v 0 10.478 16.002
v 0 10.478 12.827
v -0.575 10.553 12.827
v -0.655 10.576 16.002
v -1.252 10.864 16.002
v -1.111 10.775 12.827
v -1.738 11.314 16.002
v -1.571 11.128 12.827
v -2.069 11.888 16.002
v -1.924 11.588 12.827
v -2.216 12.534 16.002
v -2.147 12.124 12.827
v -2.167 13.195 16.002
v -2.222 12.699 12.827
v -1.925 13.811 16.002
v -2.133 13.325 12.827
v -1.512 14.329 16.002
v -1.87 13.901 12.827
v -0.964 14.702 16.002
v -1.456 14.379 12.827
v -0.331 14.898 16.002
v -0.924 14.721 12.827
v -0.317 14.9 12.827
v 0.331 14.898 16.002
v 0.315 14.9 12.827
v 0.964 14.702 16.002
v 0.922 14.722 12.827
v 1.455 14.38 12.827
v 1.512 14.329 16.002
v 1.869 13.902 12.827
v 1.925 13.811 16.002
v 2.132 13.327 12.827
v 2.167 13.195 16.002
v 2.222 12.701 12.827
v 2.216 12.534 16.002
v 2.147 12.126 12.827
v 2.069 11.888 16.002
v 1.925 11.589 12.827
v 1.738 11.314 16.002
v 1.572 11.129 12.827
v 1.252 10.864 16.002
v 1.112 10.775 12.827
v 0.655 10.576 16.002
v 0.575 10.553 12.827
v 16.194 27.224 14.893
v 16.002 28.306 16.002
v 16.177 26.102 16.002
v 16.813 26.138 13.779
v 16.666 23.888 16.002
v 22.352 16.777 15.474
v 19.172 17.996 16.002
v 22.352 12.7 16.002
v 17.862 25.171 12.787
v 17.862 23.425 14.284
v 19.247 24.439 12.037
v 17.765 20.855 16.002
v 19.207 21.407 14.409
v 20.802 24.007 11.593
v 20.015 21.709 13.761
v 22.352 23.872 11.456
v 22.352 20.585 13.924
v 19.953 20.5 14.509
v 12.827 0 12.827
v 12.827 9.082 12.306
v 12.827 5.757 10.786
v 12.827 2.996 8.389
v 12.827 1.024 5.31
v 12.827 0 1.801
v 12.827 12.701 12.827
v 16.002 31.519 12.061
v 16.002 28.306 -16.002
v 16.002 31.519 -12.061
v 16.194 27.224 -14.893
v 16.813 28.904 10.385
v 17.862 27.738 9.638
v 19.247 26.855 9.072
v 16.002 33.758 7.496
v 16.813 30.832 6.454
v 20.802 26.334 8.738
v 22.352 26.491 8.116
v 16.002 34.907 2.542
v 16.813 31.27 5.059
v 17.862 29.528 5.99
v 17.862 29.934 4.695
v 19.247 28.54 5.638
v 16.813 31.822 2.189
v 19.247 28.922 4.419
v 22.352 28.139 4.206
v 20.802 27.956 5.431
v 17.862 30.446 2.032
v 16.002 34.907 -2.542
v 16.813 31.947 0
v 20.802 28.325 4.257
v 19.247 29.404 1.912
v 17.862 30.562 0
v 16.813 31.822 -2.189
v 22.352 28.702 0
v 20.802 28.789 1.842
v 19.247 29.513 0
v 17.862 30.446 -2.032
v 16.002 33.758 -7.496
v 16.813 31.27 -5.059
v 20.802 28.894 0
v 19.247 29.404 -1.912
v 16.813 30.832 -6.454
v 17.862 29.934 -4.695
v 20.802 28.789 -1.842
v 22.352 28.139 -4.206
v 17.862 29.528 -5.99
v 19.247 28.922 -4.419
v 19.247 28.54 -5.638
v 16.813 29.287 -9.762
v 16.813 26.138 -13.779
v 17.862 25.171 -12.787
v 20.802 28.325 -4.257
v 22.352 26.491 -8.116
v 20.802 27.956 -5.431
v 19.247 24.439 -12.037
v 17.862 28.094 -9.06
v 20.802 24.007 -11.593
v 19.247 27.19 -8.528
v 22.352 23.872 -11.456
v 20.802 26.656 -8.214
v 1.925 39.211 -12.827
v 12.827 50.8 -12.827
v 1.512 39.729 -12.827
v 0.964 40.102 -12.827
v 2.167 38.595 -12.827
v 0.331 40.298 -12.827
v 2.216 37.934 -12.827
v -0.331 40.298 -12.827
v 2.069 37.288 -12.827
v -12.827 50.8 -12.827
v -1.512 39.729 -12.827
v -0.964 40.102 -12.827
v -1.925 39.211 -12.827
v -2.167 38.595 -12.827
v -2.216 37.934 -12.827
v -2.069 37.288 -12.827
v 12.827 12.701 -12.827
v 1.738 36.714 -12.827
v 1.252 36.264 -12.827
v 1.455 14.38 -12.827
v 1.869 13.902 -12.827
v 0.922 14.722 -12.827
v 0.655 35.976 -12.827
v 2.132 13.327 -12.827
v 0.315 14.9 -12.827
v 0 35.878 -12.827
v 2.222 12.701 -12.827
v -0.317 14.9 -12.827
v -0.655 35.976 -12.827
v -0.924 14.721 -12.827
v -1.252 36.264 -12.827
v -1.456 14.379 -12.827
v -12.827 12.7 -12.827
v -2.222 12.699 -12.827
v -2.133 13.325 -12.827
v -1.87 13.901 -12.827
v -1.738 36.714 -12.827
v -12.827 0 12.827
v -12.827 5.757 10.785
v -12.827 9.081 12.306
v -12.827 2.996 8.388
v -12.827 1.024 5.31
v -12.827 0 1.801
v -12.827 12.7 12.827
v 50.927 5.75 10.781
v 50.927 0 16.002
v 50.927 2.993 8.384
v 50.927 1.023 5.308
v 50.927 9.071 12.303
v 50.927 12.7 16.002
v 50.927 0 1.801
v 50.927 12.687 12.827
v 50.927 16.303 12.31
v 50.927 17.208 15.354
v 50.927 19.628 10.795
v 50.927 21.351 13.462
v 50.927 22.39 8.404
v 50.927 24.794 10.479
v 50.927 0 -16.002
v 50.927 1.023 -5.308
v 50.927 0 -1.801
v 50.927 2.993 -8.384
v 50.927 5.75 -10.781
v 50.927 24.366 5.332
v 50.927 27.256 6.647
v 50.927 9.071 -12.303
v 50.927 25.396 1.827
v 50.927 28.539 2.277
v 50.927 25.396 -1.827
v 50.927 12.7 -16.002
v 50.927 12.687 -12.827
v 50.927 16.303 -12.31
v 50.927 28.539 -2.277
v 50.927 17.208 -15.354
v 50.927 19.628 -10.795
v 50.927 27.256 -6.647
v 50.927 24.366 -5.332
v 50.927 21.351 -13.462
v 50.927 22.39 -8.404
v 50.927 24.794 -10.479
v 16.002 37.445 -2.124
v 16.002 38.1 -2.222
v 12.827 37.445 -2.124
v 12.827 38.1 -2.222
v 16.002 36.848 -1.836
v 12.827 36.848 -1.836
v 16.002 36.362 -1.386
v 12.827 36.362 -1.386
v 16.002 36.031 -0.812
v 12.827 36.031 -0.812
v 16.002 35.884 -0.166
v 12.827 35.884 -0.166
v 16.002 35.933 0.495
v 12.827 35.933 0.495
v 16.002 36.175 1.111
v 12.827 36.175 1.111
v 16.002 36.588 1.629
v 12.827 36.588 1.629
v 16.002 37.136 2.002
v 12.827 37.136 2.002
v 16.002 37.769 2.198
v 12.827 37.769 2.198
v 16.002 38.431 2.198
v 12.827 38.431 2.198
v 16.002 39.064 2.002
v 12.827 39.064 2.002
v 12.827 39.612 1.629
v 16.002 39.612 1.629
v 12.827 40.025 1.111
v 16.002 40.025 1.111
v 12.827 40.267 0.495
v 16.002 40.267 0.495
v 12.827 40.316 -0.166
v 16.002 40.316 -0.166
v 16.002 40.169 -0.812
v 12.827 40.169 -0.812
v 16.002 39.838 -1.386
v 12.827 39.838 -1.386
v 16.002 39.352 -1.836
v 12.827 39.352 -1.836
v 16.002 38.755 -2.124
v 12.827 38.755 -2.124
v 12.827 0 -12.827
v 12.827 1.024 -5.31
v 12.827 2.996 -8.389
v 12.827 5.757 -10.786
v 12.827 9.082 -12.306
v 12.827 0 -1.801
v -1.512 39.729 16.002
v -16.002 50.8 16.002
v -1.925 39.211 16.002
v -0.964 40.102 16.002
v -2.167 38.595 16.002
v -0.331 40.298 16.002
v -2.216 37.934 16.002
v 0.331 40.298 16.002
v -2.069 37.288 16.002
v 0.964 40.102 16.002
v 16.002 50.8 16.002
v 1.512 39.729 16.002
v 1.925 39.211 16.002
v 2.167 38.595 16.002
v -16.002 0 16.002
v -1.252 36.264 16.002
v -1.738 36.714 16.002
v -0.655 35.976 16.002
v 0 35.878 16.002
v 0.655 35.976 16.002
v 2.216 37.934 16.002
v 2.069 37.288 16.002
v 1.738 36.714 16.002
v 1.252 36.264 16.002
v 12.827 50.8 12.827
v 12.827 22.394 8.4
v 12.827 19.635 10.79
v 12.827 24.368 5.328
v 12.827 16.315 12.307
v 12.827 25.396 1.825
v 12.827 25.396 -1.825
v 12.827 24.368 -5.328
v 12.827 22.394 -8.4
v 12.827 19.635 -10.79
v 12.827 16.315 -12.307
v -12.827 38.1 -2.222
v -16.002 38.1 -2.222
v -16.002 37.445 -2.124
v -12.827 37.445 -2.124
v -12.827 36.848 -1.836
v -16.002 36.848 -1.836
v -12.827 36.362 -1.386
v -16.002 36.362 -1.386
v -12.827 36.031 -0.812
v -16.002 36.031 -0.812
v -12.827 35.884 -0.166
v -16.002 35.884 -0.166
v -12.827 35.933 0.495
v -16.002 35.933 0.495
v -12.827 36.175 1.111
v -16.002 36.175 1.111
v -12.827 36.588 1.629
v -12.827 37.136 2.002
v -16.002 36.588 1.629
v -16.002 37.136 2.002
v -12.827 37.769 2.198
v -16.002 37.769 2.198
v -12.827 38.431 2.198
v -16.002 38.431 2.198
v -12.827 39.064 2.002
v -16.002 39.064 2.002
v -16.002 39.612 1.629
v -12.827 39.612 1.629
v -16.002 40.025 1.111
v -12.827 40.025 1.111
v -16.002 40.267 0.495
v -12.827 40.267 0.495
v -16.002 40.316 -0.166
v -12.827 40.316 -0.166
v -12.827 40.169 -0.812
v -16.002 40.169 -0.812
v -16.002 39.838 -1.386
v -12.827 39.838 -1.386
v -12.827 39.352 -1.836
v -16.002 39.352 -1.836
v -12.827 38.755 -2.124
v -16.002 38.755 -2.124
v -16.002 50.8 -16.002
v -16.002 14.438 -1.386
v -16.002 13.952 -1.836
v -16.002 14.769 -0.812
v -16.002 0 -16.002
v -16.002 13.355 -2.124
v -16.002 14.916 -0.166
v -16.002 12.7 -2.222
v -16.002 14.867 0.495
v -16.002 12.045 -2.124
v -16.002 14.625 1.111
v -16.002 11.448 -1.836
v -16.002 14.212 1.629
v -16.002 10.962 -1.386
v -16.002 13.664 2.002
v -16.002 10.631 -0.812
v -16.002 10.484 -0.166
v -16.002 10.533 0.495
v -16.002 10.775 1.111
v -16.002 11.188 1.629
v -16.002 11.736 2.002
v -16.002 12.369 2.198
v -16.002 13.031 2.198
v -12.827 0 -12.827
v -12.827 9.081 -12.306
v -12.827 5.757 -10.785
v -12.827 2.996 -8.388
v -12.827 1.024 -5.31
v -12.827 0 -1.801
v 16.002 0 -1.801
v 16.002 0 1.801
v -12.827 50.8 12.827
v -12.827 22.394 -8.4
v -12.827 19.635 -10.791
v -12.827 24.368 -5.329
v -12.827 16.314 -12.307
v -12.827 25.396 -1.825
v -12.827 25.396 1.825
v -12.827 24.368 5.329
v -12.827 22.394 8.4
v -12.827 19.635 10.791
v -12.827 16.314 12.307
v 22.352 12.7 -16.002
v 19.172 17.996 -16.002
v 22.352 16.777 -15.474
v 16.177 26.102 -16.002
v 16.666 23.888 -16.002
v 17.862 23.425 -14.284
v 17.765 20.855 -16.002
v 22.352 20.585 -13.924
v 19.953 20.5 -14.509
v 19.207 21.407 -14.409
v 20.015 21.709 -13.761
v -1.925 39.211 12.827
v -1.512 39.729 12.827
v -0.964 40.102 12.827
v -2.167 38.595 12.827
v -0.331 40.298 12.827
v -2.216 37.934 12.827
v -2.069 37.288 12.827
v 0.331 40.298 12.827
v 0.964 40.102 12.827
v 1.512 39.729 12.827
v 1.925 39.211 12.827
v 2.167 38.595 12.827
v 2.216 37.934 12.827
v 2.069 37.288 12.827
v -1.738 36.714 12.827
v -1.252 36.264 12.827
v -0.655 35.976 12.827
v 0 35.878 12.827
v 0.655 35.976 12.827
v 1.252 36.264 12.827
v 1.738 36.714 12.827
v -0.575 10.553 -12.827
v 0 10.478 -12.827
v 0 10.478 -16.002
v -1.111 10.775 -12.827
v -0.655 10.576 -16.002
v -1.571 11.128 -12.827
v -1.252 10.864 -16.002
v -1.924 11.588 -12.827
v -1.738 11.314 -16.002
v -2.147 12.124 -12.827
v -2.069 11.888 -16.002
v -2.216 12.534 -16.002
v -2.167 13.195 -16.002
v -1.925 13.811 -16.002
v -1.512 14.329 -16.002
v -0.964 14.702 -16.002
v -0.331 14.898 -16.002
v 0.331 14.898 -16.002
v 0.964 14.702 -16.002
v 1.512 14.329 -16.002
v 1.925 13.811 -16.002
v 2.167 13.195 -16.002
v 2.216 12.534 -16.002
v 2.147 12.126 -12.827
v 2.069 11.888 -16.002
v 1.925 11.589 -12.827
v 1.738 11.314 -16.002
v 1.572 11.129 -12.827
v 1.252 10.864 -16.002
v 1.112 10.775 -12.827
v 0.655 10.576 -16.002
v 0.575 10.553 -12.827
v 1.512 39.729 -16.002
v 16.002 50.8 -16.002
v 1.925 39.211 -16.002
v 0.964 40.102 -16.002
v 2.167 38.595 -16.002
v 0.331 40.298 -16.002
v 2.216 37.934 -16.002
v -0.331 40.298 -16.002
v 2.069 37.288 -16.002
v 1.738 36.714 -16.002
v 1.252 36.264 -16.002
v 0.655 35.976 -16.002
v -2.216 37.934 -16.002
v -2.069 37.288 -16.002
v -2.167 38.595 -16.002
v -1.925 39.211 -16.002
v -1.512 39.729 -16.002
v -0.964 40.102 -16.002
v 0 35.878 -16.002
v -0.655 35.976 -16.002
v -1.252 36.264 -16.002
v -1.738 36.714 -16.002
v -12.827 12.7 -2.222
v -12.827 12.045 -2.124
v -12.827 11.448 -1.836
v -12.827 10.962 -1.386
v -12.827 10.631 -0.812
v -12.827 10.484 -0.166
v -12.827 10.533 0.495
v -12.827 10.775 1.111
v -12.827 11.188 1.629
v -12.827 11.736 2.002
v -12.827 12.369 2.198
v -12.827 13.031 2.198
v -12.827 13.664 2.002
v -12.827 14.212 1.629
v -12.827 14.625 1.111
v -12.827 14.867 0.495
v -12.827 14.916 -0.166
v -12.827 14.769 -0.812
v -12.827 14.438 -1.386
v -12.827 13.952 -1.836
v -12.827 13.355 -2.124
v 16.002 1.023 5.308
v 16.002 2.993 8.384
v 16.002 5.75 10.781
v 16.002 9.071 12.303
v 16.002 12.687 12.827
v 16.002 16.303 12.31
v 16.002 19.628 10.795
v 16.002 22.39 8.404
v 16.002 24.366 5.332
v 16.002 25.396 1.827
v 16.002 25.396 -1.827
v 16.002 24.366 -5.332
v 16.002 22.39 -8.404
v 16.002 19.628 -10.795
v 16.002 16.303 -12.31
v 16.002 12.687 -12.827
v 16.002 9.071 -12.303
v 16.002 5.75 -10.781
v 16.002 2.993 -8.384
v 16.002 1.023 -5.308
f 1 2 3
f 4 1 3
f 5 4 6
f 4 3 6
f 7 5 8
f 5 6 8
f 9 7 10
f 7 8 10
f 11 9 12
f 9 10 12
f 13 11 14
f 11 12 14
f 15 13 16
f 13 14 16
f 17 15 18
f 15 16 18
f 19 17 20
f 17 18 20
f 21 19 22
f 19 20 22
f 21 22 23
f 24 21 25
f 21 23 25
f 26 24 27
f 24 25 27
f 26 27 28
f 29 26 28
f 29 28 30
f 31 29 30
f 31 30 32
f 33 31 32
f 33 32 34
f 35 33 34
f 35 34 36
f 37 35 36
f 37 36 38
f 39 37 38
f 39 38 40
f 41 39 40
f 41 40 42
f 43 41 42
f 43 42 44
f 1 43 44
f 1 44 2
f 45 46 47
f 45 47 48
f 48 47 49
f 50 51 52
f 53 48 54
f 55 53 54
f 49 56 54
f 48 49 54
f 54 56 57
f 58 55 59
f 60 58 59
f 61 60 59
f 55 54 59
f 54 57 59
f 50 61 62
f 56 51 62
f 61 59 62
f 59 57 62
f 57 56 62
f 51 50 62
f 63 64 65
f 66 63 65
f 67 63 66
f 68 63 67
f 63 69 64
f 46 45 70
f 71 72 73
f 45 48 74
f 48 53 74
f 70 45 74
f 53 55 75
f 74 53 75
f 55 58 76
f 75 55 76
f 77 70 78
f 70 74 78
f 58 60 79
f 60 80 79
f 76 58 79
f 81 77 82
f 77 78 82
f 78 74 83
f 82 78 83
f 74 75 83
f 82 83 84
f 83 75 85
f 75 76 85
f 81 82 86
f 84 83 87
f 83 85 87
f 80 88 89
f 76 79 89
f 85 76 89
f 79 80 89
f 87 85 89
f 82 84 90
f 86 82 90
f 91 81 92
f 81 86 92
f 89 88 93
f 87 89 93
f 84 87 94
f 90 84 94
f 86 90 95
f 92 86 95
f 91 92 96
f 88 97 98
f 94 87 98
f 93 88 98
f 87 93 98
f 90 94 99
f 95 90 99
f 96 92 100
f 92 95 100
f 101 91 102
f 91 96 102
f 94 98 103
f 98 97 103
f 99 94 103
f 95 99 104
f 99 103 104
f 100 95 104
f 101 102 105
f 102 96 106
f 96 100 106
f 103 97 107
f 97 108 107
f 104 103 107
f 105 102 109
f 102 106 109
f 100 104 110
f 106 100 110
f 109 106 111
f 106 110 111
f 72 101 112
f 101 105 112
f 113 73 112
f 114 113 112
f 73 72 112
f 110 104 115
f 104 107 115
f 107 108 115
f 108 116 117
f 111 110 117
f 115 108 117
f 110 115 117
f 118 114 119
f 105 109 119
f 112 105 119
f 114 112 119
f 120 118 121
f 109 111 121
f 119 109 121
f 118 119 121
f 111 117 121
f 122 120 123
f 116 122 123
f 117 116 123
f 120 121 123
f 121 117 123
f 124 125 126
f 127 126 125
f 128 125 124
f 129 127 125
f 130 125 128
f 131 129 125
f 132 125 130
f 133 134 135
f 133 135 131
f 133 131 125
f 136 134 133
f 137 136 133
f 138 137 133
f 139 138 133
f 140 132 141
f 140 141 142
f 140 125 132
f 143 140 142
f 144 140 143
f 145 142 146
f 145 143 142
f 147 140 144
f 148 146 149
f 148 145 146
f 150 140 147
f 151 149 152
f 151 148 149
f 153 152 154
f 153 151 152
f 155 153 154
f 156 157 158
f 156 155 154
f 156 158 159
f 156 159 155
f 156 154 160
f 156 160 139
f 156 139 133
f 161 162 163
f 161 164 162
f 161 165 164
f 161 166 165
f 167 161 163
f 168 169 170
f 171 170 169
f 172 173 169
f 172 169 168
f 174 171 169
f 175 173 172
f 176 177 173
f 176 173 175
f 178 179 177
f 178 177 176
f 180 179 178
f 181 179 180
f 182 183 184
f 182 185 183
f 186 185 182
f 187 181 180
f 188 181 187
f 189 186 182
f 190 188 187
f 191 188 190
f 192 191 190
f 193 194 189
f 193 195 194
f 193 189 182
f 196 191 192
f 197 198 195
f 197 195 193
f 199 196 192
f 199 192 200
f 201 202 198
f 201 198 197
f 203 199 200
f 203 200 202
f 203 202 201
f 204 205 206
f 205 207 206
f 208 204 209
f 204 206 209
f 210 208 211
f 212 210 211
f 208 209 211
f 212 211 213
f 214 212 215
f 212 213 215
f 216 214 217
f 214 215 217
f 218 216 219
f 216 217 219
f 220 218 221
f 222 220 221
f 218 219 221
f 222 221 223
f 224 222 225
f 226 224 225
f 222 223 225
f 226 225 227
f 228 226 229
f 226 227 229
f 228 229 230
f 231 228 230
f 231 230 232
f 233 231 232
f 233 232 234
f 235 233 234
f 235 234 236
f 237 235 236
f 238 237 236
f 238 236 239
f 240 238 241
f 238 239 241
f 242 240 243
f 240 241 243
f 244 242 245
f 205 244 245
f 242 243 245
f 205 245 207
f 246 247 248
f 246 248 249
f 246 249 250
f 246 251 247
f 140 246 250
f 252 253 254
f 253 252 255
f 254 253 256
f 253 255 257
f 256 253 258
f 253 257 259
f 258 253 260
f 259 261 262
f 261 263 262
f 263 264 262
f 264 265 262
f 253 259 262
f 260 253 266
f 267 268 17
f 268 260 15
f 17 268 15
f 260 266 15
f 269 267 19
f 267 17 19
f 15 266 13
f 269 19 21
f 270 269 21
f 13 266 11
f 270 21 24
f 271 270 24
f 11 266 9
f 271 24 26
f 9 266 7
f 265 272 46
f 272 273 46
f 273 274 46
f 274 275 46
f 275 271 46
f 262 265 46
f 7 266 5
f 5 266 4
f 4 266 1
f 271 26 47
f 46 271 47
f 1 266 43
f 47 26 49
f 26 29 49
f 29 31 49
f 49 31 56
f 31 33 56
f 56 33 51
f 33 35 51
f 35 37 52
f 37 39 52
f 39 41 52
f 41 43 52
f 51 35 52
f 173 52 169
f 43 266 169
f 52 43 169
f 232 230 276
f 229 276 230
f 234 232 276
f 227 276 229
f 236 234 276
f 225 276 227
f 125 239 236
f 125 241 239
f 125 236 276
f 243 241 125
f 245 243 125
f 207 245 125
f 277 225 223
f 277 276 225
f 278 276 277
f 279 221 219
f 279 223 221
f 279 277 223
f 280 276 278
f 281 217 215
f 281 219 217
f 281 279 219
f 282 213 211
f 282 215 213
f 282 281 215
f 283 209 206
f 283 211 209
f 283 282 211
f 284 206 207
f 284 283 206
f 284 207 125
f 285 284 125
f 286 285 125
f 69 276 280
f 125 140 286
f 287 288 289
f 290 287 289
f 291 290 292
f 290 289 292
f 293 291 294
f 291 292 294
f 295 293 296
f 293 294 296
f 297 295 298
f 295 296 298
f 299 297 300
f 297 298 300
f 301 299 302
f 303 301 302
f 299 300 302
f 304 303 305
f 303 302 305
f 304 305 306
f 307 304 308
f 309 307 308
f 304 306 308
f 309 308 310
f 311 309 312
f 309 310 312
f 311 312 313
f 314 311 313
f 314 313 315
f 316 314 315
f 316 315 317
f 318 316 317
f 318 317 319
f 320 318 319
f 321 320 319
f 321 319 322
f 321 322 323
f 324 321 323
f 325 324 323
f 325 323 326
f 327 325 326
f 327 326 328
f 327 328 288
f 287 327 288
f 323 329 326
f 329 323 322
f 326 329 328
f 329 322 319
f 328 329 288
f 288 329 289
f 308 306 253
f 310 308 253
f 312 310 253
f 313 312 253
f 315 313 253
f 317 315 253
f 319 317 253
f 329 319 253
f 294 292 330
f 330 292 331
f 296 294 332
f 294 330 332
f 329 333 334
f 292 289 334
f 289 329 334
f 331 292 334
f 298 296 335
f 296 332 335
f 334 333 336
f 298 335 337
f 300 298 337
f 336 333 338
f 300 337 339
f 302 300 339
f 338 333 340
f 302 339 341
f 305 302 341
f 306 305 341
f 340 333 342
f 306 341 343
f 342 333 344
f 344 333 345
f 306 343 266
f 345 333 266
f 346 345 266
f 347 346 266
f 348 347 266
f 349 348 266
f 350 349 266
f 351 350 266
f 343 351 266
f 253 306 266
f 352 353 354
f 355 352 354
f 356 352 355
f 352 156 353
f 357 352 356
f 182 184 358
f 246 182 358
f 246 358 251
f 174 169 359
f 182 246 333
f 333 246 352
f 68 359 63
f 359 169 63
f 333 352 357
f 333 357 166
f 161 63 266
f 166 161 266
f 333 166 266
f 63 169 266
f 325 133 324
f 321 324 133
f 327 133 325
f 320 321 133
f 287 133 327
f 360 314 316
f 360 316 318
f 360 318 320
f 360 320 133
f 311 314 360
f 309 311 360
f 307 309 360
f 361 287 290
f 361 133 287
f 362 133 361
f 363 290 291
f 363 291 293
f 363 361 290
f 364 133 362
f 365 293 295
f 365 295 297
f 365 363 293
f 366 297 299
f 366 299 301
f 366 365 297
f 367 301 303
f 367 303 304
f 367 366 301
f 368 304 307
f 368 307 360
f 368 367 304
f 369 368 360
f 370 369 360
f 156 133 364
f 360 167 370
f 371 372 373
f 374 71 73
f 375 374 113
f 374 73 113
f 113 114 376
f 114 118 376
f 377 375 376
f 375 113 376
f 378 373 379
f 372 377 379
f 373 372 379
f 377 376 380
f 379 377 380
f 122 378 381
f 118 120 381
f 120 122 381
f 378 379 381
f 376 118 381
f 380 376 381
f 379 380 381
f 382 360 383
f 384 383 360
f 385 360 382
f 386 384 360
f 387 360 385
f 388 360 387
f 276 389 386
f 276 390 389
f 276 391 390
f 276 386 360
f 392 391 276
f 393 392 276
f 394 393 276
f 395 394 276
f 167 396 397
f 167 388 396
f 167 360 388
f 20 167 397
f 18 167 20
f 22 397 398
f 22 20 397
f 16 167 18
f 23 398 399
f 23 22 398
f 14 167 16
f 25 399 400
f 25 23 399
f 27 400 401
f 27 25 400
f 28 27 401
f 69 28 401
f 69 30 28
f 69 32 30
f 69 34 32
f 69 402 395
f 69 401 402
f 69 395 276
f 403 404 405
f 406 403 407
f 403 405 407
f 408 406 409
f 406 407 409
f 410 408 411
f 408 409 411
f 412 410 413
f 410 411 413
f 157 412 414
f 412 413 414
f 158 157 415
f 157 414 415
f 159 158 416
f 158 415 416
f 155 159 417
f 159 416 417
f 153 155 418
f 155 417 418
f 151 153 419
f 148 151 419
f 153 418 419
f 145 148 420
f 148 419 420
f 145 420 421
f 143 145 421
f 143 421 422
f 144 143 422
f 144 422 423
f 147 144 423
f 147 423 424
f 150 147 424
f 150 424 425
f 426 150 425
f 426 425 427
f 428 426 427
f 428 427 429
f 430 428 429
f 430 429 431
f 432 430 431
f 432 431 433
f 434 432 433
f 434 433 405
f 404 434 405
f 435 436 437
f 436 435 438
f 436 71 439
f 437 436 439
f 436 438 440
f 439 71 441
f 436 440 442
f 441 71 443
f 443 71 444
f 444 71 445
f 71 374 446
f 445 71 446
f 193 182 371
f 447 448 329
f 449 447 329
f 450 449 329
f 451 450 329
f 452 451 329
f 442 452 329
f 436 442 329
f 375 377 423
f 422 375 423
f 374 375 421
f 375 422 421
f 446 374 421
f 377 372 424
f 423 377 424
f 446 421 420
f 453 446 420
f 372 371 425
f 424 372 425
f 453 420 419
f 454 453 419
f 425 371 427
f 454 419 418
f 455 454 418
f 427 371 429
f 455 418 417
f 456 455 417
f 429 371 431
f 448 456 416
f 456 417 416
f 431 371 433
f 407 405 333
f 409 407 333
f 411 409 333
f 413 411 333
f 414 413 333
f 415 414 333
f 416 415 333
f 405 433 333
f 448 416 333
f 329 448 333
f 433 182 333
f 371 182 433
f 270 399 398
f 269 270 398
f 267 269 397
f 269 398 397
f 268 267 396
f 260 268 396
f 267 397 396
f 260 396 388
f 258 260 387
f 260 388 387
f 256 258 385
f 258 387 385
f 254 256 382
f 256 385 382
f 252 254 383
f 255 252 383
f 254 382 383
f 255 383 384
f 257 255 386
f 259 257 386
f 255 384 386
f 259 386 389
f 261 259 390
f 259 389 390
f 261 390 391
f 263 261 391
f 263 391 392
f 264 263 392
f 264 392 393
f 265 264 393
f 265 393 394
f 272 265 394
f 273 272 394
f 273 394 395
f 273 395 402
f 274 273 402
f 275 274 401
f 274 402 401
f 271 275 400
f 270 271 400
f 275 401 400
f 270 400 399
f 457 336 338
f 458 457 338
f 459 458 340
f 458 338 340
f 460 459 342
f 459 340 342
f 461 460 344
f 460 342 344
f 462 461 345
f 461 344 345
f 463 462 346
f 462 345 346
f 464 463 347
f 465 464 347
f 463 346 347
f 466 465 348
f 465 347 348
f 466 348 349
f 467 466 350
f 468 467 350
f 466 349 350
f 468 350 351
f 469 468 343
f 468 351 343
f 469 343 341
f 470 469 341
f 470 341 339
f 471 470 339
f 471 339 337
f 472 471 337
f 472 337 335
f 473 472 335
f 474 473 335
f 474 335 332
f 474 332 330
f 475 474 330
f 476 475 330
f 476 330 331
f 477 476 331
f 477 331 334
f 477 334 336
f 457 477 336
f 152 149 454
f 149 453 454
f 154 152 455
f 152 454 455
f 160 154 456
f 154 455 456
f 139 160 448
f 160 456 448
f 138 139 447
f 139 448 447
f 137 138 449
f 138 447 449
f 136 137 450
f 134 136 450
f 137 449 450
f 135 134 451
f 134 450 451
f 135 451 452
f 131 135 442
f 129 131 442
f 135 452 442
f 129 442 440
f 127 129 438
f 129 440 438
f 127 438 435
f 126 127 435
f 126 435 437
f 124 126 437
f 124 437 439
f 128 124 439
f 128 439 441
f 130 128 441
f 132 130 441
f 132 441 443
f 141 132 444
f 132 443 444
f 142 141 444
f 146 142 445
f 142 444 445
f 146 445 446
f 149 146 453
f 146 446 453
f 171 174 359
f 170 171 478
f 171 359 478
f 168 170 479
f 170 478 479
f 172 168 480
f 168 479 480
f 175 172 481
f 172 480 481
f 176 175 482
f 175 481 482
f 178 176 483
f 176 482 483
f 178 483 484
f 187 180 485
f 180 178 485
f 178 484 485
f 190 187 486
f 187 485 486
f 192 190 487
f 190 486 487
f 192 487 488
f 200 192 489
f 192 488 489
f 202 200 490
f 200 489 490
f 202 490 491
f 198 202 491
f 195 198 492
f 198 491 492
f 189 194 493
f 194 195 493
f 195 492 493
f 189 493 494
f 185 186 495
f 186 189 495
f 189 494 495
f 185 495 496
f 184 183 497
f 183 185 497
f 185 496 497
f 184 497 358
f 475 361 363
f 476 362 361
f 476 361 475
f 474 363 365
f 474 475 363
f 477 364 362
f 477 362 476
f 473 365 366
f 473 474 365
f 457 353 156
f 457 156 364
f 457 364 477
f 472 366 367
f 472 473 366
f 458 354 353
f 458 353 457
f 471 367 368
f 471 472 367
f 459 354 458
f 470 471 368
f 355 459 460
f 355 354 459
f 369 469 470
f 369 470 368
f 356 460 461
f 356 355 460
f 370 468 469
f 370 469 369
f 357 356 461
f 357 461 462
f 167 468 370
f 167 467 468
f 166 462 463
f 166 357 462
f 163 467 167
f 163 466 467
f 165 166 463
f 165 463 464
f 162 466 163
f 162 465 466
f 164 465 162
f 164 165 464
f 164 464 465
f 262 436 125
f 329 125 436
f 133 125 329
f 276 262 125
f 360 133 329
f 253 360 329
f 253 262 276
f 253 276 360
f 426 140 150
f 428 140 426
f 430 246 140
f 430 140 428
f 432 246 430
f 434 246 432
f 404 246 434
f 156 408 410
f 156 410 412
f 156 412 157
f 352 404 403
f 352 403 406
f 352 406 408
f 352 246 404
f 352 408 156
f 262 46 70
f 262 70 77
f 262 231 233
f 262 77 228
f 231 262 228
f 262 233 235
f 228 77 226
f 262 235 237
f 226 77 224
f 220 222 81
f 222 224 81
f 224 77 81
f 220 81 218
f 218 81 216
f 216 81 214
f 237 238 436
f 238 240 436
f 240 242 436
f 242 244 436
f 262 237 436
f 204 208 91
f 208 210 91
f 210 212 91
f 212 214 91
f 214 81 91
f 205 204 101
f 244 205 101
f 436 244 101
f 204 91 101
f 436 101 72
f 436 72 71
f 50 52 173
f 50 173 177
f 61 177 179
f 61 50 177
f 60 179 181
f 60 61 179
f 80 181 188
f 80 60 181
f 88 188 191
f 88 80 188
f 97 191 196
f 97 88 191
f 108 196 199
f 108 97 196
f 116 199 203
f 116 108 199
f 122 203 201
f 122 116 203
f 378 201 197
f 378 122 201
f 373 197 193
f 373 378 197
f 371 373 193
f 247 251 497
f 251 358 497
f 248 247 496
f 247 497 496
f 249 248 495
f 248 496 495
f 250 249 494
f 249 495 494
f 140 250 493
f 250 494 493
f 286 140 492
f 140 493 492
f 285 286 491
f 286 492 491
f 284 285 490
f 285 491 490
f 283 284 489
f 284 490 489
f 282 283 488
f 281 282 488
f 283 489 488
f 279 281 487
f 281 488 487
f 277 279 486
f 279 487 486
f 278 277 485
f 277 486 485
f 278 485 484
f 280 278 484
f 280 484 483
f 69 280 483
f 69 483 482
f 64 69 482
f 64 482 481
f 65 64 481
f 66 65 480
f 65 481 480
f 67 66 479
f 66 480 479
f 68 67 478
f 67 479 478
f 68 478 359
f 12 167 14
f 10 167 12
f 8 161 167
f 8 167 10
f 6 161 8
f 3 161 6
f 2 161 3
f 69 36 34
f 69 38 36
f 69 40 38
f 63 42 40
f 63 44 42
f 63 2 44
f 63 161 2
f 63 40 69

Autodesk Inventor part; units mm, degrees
ref_plane "YZ Plane" through (0, 0, 0) normal (1, 0, 0) x (0, 1, 0)
ref_plane "XZ Plane" through (0, 0, 0) normal (0, 1, 0) x (-1, 0, 0)
ref_plane "XY Plane" through (0, 0, 0) normal (0, 0, 1) x (1, 0, 0)
sketch "Sketch1" plane through (0, 0, 0) normal (0, 1, 0) x (-1, 0, 0)
  line L0 (12.827, 12.827) -> (-12.827, 12.827)
  line L1 (-12.827, 12.827) -> (-12.827, -12.827)
  line L2 (-12.827, -12.827) -> (12.827, -12.827)
  line L3 (12.827, -12.827) -> (12.827, 12.827)
  line L4 (12.827, 12.827) -> (-12.827, -12.827) construction
  line L5 (-12.827, 12.827) -> (12.827, -12.827) construction
  line L6 (16.002, 16.002) -> (-16.002, 16.002)
  line L7 (-16.002, 16.002) -> (-16.002, -16.002)
  line L8 (-16.002, -16.002) -> (16.002, -16.002)
  line L9 (16.002, -16.002) -> (16.002, 16.002)
  point P0 (0, 0)
  dimension "d0" = 25.654
  dimension "d1" = 25.654
  dimension "d2" = 3.175
extrude "Extrusion1" add sketch "Sketch1" along normal blind 50.8
sketch "Sketch2" plane through (16.002, 0, 16.002) normal (1, 0, 0) x (0, 0, -1)
  line L0 (0, 50.8) -> (32.004, 50.8) projected
  point P0 (16.002, 0)
  point P1 (16.002, 12.7)
  point P2 (16.002, 38.1)
  point P3 (16.002, 50.8)
  dimension "d5" = 12.7
  dimension "d6" = 25.4
hole "Hole1" at (16.002, 12.7, 0) at (16.002, 38.1, 0) direction (-1, 0, 0) diameter 4.445 end through all
sketch "Sketch3" plane through (-16.002, 0, 16.002) normal (0, 0, 1) x (1, 0, 0)
  line L0 (0, 50.8) -> (32.004, 50.8) projected
  point P0 (16.002, 0)
  point P1 (16.002, 12.7)
  point P2 (16.002, 38.1)
  point P3 (32.004, 38.1)
  point P4 (32.004, 12.7)
  point P5 (16.002, 50.8)
hole "Hole2" at (0, 38.1, 16.002) at (0, 12.7, 16.002) direction (0, 0, -1) diameter 4.445 end through all
sketch "Sketch4" plane through (16.002, 0, 16.002) normal (1, 0, 0) x (0, 0, -1)
  circle A0 centre (16.002, 12.7) radius 2.2225 projected
  circle A1 centre (16.002, 12.7) radius 12.7
  circle A2 centre (16.002, 12.7) radius 16.002
  line L0 (32.004, 0) -> (32.004, 50.8) projected
  line L1 (0, 0) -> (32.004, 0) projected
  line L2 (0, 0) -> (0, 50.8) projected
  circle A3 centre (16.002, 12.7) radius 2.2225 projected
  circle A4 centre (16.002, 12.7) radius 12.827
  point P0 (16.002, 0)
  point P1 (0, 12.7)
  point P2 (32.004, 12.7)
  point P3 (14.201464, 0)
  point P4 (17.802536, 0)
  dimension "d26" = 25.4
  dimension "d27" = 25.654
extrude "Extrusion2" add sketch "Sketch4" along normal blind 34.925 contours L1 A2 A4 | L1 L2 A2 | A2 L0 L1 picked at (30.667502, 14.995372)
sketch "Sketch4 outline for Extrusion3" plane through (16.002, 0, 16.002) normal (1, 0, 0) x (0, 0, -1)
  circle A0 centre (16.002, 12.7) radius 2.2225
  arc A1 (17.802536, 0) -> (14.201464, 0) centre (16.002, 12.7) ccw
  line L0 (14.201464, 0) -> (17.802536, 0)
extrude "Extrusion3" cut sketch "Sketch4 outline for Extrusion3" against normal up to surface (28.829 mm away)
fillet "Fillet1" radius 6.35 1 edges at (16.002, 28.702, 0)
properties part number "Tracking Wheel Guide"
